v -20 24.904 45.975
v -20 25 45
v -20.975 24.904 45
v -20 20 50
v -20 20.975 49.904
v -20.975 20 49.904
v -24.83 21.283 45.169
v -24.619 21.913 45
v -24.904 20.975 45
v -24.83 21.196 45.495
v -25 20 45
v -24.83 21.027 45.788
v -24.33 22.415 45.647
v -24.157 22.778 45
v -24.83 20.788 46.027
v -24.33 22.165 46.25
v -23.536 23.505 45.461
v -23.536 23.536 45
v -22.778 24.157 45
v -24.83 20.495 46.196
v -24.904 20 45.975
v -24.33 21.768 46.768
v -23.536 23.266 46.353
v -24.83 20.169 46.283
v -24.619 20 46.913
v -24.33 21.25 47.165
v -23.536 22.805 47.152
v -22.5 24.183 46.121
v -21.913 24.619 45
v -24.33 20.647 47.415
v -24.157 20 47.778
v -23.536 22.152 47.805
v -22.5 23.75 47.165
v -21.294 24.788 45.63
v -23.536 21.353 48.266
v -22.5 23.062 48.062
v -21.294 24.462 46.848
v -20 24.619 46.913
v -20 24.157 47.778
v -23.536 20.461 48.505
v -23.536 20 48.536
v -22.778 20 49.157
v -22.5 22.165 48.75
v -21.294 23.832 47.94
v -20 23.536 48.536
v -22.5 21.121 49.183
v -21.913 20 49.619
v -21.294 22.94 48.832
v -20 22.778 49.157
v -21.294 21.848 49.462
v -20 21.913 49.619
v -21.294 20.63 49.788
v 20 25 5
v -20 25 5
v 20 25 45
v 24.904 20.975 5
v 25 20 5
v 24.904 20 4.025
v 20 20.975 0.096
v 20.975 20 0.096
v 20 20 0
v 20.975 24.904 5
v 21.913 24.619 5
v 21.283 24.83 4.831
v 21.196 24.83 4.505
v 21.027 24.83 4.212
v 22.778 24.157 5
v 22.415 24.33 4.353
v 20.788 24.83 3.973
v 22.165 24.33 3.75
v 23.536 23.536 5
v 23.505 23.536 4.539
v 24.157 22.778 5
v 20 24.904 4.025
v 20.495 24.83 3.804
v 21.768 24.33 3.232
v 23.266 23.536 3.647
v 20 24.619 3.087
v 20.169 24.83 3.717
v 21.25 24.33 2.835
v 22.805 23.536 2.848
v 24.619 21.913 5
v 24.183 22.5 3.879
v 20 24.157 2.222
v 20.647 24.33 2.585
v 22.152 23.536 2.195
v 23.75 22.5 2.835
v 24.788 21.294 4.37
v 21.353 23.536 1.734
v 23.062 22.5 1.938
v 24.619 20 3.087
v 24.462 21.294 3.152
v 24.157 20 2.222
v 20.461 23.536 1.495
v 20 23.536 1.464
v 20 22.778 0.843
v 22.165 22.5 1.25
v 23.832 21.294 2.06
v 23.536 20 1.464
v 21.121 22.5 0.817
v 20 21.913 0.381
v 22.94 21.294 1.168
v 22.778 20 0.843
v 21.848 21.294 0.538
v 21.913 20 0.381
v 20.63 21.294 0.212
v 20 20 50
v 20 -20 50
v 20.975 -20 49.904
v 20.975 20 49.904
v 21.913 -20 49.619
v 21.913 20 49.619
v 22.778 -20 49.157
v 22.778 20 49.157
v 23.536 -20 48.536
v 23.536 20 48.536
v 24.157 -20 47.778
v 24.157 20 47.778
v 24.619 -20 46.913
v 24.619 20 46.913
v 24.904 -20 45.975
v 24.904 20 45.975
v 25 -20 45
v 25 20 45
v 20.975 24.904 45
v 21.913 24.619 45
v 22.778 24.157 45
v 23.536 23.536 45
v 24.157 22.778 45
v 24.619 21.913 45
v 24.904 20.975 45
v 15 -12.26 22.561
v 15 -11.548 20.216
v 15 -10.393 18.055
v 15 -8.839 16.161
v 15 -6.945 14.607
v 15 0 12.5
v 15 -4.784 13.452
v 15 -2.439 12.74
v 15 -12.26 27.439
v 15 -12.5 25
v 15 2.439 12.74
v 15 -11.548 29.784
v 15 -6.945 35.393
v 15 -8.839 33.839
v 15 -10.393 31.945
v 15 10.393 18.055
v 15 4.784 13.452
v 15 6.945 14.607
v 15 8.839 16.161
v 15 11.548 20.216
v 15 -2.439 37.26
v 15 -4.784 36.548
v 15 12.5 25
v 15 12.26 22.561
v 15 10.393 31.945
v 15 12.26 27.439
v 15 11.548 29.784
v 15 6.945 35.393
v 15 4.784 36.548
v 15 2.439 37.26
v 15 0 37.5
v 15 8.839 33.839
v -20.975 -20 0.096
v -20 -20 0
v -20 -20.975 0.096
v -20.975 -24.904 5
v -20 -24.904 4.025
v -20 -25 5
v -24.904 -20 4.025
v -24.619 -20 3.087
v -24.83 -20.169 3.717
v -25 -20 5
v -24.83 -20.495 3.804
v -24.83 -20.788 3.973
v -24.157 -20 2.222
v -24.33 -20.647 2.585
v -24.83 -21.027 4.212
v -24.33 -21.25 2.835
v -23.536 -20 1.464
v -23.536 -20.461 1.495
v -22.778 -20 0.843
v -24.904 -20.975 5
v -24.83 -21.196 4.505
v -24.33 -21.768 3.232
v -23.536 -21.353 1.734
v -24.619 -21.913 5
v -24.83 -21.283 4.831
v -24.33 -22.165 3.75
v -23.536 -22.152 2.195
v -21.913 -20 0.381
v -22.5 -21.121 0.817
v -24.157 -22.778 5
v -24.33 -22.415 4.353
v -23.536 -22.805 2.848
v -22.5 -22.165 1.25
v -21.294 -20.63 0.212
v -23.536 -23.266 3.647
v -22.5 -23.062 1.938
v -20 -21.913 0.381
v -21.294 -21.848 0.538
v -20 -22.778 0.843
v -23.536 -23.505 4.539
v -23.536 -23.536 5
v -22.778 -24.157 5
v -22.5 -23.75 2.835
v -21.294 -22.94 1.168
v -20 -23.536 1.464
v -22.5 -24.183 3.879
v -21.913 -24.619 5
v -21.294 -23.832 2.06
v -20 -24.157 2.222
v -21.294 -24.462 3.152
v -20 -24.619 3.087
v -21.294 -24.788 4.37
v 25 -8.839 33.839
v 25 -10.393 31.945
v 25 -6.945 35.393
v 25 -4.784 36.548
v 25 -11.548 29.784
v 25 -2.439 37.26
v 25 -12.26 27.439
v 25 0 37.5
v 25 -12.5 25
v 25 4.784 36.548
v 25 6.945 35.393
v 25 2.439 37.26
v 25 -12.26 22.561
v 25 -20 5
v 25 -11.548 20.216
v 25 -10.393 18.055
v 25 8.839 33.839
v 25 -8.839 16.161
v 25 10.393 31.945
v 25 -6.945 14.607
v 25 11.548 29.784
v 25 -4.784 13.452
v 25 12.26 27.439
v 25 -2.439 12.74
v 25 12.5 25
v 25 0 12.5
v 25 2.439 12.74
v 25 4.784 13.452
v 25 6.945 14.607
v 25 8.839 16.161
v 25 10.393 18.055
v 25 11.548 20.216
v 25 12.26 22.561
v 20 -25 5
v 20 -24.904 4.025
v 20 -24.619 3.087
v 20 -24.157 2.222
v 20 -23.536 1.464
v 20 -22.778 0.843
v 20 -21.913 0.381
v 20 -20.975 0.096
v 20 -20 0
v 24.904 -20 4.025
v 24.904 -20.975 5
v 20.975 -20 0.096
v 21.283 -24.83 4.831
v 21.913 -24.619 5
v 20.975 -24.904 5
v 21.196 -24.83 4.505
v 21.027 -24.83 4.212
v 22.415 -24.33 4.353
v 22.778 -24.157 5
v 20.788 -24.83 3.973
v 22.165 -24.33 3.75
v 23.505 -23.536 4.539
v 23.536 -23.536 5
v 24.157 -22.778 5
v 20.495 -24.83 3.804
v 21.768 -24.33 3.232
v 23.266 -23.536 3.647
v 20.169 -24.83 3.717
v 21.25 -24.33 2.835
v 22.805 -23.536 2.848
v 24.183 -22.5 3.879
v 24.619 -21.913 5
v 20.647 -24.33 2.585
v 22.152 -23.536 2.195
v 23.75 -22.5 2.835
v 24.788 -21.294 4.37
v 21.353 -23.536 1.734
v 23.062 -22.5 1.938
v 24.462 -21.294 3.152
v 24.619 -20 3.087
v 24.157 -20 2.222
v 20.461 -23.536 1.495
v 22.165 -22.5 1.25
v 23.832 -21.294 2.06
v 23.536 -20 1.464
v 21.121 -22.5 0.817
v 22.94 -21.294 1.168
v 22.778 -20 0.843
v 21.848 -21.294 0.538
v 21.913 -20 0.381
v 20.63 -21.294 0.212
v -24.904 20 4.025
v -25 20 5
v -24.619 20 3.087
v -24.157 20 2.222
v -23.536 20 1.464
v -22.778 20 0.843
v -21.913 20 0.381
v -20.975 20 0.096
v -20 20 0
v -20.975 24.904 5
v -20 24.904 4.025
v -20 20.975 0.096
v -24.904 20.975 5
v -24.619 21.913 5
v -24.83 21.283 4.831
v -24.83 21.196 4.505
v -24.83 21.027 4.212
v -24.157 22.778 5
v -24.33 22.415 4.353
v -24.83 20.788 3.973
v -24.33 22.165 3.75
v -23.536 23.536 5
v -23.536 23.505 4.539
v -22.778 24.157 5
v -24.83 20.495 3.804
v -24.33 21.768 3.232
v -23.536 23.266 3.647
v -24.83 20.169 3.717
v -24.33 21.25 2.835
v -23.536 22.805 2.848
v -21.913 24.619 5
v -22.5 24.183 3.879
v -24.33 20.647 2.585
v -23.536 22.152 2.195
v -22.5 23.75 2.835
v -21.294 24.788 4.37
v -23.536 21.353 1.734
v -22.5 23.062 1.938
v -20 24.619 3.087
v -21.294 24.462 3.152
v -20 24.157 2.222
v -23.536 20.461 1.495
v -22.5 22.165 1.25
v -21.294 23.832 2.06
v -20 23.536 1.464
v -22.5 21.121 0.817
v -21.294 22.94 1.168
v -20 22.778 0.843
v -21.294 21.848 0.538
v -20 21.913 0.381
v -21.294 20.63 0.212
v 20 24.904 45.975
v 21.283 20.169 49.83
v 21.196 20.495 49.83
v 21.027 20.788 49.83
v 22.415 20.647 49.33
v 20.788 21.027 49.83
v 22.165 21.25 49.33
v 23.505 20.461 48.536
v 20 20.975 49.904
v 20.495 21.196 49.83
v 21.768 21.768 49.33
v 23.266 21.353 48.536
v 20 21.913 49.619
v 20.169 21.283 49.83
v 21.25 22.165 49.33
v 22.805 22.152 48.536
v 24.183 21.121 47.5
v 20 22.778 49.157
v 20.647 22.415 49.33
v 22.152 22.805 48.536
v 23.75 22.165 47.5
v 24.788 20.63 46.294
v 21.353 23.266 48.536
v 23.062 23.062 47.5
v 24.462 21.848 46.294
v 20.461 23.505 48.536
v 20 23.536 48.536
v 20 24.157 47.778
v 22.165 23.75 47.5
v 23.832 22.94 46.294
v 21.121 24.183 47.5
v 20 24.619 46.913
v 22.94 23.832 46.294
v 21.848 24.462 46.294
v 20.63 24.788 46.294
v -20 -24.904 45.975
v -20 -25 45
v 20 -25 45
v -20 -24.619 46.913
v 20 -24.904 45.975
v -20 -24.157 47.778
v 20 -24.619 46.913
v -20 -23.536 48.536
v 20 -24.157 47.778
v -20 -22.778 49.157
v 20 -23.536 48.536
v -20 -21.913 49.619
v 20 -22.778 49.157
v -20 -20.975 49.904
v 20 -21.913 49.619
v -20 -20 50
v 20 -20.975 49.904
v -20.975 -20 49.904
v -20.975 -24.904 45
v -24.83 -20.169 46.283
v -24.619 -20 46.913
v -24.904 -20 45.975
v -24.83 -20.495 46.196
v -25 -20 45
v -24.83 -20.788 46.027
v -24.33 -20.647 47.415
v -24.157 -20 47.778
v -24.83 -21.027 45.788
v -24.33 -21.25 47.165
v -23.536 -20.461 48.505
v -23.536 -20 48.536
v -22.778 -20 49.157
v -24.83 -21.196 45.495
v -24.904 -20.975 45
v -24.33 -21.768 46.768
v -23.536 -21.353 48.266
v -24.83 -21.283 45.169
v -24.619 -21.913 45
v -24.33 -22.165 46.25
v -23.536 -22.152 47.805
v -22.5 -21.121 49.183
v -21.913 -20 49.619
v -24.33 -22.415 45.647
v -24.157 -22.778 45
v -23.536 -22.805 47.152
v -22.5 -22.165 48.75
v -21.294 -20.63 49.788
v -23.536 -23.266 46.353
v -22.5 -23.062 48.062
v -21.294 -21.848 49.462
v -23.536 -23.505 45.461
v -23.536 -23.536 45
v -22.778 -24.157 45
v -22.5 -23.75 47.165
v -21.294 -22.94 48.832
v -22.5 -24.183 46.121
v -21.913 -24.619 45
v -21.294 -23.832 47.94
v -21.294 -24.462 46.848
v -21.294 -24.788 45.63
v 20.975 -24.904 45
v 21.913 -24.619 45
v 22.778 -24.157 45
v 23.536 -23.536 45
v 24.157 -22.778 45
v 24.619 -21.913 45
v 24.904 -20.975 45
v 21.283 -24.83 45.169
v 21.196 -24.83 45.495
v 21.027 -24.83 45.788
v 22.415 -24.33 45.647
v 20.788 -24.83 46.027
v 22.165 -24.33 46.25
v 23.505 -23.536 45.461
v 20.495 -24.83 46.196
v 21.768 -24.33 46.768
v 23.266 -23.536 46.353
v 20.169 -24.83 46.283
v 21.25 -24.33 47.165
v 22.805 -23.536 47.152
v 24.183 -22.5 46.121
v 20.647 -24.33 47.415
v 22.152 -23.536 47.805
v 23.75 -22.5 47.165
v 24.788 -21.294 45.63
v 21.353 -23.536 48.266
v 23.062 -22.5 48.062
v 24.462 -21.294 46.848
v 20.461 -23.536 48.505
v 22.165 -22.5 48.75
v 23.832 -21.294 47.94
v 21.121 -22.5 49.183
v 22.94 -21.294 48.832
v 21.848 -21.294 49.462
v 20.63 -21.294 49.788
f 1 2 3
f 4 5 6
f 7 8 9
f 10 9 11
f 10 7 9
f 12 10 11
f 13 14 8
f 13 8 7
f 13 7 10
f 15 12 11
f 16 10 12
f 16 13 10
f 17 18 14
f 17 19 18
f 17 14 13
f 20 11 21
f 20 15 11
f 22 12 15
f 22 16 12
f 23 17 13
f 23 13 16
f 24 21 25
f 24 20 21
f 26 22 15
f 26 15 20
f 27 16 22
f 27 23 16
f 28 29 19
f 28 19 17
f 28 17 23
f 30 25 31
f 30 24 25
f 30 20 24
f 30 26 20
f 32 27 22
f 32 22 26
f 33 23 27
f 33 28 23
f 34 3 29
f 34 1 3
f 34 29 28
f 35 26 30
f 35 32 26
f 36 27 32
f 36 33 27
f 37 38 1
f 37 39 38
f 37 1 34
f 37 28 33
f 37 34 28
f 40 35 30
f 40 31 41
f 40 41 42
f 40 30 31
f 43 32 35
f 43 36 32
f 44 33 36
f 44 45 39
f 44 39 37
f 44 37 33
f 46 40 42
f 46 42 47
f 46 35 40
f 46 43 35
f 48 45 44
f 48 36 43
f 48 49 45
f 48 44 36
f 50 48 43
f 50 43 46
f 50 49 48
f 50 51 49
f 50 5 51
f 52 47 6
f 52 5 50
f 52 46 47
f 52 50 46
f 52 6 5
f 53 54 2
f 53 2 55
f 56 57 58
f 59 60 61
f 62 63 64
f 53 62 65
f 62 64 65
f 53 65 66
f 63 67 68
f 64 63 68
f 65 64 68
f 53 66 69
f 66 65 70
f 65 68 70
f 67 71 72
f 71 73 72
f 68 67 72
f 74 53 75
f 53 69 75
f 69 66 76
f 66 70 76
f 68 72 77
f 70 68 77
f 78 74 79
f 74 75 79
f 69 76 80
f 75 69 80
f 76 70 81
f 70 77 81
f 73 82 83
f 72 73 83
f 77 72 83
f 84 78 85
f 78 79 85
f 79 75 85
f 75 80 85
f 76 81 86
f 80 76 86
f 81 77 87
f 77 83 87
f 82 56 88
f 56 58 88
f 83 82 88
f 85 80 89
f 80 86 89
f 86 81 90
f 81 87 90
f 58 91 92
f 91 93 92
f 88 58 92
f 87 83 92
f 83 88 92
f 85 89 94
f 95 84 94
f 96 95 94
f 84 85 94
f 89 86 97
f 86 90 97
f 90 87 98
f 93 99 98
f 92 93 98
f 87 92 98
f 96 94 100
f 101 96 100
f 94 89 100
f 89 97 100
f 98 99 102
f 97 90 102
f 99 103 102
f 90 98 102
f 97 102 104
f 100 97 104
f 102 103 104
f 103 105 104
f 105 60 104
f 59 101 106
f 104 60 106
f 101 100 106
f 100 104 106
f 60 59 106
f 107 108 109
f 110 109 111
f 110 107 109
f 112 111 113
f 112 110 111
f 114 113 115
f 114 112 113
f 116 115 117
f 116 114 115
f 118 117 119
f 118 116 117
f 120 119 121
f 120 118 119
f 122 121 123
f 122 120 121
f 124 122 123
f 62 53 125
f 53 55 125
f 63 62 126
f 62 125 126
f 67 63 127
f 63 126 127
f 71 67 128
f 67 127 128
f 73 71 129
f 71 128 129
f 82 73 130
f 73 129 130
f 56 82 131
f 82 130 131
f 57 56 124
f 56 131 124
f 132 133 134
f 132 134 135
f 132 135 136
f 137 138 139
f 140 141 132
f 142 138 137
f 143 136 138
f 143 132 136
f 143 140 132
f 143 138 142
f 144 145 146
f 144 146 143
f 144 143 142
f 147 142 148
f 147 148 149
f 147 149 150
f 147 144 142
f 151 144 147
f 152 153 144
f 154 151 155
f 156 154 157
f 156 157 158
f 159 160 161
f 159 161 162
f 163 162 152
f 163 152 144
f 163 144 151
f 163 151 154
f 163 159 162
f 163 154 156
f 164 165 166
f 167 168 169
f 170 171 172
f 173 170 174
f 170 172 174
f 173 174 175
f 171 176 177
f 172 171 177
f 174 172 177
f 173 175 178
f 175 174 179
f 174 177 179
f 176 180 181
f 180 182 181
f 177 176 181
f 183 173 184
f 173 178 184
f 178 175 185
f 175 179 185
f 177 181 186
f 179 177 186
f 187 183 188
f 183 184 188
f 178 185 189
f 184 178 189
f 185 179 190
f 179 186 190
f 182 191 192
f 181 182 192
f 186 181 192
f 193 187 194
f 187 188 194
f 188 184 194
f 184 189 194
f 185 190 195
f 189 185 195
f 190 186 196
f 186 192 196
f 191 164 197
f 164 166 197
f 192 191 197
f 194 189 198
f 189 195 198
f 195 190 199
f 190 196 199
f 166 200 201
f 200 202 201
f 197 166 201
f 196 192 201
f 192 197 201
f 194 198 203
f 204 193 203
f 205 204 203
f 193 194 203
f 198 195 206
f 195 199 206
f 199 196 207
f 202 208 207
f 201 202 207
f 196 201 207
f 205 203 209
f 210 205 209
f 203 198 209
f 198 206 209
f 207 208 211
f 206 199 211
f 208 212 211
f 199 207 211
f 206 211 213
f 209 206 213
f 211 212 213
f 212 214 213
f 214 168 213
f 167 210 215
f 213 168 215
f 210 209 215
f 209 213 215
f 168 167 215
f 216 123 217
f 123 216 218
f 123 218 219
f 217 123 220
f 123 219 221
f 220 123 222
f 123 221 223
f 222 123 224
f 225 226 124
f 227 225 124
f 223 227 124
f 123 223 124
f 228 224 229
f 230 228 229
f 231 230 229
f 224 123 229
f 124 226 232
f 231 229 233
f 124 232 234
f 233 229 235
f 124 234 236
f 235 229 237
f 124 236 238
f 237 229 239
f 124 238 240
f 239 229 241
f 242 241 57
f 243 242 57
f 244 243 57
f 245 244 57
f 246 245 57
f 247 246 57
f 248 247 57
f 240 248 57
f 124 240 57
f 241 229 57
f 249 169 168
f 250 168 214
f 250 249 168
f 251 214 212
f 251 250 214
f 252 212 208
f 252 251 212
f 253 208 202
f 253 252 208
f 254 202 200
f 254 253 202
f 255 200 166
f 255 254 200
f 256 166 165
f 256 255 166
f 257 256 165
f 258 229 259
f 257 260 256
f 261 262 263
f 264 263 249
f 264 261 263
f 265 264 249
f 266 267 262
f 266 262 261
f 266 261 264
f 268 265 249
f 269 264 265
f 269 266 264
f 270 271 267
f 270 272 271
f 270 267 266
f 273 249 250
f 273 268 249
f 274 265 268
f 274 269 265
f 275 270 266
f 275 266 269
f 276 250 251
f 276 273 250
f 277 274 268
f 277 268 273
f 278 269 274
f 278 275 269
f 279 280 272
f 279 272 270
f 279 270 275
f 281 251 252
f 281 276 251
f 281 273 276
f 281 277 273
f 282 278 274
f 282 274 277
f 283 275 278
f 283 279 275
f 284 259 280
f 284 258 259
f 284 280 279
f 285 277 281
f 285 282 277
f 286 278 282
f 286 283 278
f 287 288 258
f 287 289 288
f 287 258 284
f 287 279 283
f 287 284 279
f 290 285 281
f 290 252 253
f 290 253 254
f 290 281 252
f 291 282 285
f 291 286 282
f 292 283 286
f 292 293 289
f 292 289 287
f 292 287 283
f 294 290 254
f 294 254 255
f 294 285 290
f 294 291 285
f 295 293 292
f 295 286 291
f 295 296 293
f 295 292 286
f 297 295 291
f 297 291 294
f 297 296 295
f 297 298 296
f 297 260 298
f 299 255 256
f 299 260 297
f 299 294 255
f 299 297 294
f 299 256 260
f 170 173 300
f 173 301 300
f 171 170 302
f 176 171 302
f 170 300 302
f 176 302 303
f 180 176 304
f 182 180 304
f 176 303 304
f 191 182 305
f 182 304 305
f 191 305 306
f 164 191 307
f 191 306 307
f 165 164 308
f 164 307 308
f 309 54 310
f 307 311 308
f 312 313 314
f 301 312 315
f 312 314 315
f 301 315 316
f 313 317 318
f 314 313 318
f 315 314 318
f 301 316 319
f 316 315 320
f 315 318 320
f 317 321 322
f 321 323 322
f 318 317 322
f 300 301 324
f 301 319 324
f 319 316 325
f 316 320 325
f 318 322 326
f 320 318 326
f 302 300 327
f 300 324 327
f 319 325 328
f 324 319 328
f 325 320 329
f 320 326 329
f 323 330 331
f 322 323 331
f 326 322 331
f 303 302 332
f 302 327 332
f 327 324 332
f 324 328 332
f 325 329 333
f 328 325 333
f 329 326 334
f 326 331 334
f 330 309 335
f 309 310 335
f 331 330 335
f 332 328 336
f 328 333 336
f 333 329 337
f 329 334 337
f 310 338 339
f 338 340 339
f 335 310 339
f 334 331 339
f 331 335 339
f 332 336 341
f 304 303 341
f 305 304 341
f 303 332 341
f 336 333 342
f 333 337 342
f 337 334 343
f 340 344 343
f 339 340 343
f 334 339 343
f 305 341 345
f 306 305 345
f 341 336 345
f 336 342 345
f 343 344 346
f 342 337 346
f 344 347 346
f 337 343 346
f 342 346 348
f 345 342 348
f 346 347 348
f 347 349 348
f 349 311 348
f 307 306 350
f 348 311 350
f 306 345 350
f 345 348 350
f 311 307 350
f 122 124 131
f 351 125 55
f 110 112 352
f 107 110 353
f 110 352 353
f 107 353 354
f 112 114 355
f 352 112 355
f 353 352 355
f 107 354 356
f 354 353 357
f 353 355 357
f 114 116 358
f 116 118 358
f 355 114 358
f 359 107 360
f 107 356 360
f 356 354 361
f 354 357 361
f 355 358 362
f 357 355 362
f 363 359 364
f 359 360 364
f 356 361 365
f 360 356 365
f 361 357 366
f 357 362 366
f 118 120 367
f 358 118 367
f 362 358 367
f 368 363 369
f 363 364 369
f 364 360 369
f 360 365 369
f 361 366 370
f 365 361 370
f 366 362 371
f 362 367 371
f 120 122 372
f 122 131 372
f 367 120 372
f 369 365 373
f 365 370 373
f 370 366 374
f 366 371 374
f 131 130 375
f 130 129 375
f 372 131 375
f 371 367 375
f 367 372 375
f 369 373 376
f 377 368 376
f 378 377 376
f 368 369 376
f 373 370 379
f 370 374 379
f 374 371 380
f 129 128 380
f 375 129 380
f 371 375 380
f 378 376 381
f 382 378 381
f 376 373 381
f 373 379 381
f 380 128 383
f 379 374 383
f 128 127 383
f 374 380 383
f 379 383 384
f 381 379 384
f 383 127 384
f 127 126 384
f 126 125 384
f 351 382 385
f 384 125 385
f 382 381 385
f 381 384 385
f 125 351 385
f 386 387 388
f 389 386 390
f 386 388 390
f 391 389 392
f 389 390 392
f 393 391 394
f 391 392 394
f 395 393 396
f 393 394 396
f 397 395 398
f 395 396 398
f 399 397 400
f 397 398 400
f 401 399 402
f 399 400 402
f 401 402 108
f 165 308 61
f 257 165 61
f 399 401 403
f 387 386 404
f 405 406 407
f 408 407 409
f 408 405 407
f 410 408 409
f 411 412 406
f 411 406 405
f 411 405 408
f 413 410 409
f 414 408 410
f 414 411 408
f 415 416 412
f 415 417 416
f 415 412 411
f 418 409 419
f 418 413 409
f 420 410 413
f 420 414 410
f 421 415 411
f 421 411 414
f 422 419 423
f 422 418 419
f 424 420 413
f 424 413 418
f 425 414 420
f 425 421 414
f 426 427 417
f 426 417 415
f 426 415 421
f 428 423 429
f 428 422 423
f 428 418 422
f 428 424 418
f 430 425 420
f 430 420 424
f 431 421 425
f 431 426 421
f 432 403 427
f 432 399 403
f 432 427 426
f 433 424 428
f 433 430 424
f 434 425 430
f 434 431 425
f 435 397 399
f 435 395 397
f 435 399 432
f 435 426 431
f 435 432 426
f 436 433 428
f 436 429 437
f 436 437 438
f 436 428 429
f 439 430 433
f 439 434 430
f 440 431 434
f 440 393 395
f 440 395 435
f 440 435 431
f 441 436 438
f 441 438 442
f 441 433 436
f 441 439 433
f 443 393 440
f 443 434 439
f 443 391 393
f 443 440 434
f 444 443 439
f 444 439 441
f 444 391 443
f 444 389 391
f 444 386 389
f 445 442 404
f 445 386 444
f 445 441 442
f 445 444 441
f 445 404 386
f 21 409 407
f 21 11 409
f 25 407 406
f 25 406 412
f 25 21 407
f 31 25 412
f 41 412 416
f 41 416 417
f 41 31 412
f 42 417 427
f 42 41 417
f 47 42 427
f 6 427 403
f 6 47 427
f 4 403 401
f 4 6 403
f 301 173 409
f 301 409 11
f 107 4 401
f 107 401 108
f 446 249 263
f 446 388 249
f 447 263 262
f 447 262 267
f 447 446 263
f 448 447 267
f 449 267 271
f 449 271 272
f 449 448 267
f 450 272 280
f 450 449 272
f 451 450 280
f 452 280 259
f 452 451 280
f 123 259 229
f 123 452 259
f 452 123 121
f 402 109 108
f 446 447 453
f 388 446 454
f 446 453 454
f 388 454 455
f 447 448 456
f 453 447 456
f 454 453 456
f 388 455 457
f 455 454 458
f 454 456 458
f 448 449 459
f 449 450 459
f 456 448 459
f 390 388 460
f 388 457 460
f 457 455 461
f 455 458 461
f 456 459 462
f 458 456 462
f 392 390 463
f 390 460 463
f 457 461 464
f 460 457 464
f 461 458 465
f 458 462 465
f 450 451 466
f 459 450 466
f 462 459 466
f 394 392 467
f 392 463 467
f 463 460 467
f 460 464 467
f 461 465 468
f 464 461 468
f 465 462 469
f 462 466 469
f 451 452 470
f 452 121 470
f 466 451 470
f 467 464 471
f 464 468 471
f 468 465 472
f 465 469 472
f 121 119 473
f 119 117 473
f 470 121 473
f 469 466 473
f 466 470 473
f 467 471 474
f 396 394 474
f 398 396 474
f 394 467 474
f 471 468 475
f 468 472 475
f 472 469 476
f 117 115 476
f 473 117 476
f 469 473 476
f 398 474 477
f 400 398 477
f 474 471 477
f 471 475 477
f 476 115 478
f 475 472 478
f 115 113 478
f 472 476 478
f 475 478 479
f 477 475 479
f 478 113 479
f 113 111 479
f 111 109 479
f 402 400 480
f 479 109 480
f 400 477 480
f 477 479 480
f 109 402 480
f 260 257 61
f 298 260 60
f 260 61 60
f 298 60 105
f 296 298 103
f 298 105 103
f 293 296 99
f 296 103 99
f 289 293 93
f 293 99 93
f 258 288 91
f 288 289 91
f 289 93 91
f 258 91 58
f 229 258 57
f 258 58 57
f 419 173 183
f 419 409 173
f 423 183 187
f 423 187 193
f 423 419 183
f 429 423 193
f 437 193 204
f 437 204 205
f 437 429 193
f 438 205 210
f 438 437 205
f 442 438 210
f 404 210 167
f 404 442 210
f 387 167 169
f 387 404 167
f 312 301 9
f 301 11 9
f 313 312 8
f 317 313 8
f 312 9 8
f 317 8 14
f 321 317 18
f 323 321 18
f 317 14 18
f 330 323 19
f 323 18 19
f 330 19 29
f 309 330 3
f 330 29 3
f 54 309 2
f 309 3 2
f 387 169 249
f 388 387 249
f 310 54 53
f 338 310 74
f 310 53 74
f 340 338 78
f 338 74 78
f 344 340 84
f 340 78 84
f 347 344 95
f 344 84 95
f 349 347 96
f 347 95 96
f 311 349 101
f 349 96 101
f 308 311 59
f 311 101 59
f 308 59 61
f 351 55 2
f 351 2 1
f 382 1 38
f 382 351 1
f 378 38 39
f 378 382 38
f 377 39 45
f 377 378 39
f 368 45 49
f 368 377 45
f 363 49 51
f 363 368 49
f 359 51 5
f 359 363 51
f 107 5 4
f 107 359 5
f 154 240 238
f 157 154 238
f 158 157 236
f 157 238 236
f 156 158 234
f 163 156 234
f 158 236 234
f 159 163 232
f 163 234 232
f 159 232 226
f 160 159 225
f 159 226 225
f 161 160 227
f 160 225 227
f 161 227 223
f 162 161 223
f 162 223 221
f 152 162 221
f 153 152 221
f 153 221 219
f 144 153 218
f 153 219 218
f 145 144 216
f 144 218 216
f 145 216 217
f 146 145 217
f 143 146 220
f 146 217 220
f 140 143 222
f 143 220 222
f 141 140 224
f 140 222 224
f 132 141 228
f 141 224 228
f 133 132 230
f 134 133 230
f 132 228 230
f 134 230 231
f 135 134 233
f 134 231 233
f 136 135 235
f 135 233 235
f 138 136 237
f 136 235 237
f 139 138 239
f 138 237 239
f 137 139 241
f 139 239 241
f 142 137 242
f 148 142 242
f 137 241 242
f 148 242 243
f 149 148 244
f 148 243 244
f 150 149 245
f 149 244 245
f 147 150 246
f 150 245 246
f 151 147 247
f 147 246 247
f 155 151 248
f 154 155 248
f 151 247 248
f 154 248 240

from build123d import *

# Parameters (mm, degrees)
F0_W     = 50
F0_H     = 50
F1_DEPTH = 50
F2_R     = 12.5
F3_DEPTH = 10
F4_R     = 5


with BuildPart() as f1:
    # F0 (on Top) → F1 (new body)
    with BuildSketch(Plane.XY):
        Rectangle(F0_W, F0_H)
    extrude(amount=F1_DEPTH)

    # F2 (on face) → F3 (cut)
    with BuildSketch(Plane.YZ.offset(25)):
        with Locations((0, 25)):
            Circle(F2_R)
    extrude(amount=-F3_DEPTH, mode=Mode.SUBTRACT)

    # F4
    f4_edges = [f1.edges().sort_by_distance(p)[0] for p in [
        (25, 0, 0),
        (25, 25, 25),
        (25, 0, 50),
        (25, -25, 25),
        (0, 25, 0),
        (0, -25, 0),
        (0, -25, 50),
        (0, 25, 50),
        (-25, 25, 25),
        (-25, 0, 0),
        (-25, 0, 50),
        (-25, -25, 25),
    ]]
    fillet(f4_edges, radius=F4_R)


solid = f1.part
